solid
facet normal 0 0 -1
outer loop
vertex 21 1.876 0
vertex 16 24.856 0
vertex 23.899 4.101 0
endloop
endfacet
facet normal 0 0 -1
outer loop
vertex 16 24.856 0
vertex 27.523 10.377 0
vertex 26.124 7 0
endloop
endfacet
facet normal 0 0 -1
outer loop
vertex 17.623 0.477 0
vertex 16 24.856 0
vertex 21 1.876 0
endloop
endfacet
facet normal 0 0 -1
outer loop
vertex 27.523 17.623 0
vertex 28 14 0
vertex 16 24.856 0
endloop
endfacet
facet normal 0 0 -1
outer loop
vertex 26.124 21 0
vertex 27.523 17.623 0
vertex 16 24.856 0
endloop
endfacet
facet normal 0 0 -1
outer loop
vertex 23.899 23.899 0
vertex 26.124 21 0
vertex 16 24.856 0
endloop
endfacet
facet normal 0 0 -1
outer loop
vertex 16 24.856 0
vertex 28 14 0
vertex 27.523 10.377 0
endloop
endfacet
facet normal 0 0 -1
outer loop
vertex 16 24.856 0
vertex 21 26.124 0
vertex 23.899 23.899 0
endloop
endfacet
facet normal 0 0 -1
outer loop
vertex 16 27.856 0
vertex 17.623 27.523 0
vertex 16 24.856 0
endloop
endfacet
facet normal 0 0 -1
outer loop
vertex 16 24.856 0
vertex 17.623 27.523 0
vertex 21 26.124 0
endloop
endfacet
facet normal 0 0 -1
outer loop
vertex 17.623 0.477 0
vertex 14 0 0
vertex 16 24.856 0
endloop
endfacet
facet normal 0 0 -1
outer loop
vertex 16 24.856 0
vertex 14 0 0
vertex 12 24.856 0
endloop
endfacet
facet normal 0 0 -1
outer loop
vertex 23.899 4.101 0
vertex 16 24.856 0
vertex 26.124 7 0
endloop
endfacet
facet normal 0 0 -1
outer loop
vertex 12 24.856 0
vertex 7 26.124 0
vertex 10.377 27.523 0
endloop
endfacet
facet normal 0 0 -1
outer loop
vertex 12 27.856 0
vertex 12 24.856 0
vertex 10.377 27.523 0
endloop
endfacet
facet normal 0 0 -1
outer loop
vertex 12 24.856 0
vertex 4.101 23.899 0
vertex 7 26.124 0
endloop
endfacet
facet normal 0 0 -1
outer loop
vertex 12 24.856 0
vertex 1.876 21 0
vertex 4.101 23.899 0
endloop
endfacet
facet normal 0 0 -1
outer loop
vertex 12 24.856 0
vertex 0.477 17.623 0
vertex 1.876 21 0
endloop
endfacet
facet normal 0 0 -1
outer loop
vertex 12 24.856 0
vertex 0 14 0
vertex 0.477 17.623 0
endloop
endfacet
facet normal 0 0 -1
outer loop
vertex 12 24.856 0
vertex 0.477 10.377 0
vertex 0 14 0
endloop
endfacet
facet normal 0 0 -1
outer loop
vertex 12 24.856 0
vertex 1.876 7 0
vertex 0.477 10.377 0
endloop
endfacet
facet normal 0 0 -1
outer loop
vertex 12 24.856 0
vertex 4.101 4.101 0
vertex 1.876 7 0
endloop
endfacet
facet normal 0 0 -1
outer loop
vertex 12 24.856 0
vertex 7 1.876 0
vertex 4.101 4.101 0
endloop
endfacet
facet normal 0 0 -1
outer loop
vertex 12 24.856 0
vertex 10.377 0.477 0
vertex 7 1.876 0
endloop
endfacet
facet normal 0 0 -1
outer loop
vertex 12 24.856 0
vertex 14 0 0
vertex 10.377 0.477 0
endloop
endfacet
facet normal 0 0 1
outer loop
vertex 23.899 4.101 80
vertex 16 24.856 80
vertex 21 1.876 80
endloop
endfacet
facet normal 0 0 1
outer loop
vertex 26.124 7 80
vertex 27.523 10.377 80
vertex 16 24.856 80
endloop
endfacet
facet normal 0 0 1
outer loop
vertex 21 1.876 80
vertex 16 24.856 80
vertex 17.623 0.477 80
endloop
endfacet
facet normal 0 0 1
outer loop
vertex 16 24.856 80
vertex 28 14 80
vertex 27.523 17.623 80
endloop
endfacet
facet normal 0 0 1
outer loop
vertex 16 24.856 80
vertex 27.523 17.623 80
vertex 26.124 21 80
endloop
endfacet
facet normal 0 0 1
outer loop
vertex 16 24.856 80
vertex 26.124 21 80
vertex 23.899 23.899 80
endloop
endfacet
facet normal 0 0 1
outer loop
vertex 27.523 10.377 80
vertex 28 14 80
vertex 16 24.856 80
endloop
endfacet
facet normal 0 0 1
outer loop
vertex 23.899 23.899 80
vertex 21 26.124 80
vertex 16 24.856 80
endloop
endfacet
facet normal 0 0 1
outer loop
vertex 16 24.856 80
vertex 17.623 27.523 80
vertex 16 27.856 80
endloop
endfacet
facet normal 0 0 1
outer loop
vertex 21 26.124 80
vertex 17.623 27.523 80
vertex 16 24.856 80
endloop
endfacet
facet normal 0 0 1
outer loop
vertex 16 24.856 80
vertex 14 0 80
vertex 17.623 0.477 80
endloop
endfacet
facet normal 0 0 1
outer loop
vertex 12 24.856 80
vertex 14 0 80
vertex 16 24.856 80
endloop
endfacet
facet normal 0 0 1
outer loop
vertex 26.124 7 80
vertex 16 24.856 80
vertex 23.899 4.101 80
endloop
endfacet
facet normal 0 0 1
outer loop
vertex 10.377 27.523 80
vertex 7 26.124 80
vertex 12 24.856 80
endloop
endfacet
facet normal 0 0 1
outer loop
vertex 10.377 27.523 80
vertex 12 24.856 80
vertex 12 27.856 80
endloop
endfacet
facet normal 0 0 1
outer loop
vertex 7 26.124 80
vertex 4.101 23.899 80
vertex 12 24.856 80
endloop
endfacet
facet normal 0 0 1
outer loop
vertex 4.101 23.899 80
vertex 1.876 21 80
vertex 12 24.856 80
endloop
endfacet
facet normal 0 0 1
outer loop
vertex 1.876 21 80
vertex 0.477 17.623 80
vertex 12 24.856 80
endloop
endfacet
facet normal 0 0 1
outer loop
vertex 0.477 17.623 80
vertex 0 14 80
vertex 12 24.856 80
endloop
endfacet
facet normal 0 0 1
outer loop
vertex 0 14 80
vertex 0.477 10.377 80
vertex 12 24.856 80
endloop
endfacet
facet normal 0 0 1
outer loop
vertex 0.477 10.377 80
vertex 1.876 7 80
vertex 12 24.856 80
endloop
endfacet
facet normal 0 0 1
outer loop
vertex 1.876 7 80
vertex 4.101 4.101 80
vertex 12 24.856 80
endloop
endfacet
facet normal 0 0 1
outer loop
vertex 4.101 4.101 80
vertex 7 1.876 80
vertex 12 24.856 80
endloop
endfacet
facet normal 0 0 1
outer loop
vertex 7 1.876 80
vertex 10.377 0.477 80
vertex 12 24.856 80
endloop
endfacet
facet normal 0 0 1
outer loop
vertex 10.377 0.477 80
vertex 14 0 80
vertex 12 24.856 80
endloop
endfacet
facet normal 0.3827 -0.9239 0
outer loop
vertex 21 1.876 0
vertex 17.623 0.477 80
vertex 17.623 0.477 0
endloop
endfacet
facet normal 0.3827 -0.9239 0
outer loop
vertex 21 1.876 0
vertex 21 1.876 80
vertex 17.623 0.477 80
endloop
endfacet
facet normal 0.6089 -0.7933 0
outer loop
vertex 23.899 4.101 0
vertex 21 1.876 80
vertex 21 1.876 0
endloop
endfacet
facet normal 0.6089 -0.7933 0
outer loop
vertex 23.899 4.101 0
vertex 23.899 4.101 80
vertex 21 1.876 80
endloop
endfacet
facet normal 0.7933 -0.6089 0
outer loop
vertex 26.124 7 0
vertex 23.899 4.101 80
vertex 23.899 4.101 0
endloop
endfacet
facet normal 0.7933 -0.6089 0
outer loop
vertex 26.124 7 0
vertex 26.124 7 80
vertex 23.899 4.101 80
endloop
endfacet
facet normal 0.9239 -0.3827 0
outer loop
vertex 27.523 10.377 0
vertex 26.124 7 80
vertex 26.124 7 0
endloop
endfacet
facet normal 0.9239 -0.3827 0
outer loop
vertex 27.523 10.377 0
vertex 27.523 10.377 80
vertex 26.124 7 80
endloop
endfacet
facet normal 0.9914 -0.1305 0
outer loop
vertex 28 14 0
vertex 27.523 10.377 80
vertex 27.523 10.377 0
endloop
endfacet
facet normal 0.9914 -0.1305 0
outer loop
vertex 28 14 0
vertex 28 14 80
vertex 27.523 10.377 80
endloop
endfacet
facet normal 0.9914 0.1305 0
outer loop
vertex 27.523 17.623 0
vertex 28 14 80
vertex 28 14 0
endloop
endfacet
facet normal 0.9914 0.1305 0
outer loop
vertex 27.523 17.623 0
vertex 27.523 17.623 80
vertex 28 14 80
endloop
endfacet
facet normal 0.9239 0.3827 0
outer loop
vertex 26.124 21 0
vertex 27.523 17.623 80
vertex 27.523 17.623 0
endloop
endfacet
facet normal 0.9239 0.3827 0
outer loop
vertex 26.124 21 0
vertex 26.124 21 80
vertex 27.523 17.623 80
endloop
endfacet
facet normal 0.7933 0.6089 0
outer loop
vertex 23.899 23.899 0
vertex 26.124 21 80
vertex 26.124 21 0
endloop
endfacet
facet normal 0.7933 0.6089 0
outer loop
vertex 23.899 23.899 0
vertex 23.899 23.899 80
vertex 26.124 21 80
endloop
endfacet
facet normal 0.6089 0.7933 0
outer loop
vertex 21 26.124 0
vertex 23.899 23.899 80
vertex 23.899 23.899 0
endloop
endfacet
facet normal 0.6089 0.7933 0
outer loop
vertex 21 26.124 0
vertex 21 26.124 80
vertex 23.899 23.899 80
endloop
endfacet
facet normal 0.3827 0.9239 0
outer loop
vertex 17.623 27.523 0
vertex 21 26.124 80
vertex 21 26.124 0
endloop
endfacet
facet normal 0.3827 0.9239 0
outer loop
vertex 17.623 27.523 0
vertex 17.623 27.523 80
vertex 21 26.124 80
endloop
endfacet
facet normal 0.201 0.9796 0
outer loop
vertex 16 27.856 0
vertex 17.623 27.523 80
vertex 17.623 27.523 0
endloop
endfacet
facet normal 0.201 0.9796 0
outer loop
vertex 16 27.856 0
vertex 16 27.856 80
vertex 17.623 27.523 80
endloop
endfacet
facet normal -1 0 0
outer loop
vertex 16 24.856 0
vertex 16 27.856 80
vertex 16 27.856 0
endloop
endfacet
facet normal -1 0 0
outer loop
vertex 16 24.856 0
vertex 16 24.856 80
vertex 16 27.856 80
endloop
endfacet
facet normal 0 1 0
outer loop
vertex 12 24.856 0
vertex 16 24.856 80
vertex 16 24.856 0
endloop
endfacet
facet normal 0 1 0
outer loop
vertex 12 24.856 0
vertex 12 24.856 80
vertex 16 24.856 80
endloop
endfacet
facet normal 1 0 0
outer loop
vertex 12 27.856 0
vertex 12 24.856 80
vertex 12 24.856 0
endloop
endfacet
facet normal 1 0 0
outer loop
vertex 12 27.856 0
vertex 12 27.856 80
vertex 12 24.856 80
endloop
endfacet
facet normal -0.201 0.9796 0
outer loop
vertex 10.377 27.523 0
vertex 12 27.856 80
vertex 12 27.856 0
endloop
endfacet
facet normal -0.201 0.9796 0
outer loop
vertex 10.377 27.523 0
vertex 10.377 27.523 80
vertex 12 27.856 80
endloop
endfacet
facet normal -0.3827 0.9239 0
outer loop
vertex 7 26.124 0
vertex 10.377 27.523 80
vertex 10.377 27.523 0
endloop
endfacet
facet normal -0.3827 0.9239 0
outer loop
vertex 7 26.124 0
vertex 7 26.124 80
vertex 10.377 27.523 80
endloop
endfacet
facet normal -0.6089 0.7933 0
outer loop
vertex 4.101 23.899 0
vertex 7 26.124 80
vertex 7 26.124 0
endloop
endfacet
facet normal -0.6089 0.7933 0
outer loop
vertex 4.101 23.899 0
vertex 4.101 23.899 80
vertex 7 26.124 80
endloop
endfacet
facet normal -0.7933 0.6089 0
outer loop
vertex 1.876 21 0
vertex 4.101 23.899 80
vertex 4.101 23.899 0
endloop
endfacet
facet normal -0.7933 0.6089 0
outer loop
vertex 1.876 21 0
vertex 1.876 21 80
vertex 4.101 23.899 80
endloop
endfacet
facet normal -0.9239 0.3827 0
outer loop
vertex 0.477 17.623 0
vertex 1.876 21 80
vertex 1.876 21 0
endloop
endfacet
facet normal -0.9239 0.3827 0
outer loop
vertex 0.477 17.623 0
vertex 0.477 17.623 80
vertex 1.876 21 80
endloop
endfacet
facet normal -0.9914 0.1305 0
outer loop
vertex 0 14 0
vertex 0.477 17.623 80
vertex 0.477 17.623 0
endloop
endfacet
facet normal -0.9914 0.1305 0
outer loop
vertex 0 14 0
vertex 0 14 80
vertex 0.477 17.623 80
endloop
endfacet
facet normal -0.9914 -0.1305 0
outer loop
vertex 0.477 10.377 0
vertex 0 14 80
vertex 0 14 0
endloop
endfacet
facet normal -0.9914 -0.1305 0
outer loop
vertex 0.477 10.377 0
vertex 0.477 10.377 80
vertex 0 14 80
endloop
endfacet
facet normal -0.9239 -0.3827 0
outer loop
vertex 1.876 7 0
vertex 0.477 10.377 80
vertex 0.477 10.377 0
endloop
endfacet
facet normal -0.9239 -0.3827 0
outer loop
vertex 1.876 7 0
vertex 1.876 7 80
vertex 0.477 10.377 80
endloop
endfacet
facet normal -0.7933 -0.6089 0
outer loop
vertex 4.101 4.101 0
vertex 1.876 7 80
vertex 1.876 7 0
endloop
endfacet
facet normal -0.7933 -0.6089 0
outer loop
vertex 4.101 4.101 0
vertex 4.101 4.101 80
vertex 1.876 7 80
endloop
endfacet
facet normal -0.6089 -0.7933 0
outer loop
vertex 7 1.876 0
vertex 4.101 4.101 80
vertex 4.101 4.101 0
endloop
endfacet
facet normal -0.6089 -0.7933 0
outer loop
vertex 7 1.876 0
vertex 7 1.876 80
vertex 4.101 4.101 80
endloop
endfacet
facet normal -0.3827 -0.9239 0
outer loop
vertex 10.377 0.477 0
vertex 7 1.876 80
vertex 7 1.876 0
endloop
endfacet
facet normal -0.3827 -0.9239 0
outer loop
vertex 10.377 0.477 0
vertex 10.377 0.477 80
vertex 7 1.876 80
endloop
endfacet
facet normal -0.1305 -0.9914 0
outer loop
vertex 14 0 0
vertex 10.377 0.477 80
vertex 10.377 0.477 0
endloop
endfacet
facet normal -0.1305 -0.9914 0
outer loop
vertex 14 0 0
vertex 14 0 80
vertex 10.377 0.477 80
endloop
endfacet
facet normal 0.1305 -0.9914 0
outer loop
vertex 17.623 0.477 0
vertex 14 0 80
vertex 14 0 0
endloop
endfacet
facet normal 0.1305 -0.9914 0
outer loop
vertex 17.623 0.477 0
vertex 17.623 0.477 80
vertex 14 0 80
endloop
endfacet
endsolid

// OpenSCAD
$fn = 32;

// ----------------------------------------------------------------------
// Keyway shaft: d28 shaft, key 4 x 3 mm
// ----------------------------------------------------------------------

// --- parameters (mm) ---
shaft_r = 14;             // shaft radius
key_w = 4;                // keyway width
key_d = 3;                // keyway depth below the surface line
plate_t = 80;             // shaft length, Z (extrusion height)

shaft_d = 2 * shaft_r;  // shaft diameter
circle_step = 15;  // polygon sampling step, degrees

profile = [[10.377, 27.523], [7, 26.124], [4.101, 23.899], [1.876, 21], [0.477, 17.623], [0, 14], [0.477, 10.377], [1.876, 7], [4.101, 4.101], [7, 1.876], [10.377, 0.477], [14, 0], [17.623, 0.477], [21, 1.876], [23.899, 4.101], [26.124, 7], [27.523, 10.377], [28, 14], [27.523, 17.623], [26.124, 21], [23.899, 23.899], [21, 26.124], [17.623, 27.523], [16, 27.856], [16, 24.856], [12, 24.856], [12, 27.856]];  // primary outline, 27 points, counter clockwise

// --- the one profile operation ---
linear_extrude(height = plate_t) polygon(points = profile);
